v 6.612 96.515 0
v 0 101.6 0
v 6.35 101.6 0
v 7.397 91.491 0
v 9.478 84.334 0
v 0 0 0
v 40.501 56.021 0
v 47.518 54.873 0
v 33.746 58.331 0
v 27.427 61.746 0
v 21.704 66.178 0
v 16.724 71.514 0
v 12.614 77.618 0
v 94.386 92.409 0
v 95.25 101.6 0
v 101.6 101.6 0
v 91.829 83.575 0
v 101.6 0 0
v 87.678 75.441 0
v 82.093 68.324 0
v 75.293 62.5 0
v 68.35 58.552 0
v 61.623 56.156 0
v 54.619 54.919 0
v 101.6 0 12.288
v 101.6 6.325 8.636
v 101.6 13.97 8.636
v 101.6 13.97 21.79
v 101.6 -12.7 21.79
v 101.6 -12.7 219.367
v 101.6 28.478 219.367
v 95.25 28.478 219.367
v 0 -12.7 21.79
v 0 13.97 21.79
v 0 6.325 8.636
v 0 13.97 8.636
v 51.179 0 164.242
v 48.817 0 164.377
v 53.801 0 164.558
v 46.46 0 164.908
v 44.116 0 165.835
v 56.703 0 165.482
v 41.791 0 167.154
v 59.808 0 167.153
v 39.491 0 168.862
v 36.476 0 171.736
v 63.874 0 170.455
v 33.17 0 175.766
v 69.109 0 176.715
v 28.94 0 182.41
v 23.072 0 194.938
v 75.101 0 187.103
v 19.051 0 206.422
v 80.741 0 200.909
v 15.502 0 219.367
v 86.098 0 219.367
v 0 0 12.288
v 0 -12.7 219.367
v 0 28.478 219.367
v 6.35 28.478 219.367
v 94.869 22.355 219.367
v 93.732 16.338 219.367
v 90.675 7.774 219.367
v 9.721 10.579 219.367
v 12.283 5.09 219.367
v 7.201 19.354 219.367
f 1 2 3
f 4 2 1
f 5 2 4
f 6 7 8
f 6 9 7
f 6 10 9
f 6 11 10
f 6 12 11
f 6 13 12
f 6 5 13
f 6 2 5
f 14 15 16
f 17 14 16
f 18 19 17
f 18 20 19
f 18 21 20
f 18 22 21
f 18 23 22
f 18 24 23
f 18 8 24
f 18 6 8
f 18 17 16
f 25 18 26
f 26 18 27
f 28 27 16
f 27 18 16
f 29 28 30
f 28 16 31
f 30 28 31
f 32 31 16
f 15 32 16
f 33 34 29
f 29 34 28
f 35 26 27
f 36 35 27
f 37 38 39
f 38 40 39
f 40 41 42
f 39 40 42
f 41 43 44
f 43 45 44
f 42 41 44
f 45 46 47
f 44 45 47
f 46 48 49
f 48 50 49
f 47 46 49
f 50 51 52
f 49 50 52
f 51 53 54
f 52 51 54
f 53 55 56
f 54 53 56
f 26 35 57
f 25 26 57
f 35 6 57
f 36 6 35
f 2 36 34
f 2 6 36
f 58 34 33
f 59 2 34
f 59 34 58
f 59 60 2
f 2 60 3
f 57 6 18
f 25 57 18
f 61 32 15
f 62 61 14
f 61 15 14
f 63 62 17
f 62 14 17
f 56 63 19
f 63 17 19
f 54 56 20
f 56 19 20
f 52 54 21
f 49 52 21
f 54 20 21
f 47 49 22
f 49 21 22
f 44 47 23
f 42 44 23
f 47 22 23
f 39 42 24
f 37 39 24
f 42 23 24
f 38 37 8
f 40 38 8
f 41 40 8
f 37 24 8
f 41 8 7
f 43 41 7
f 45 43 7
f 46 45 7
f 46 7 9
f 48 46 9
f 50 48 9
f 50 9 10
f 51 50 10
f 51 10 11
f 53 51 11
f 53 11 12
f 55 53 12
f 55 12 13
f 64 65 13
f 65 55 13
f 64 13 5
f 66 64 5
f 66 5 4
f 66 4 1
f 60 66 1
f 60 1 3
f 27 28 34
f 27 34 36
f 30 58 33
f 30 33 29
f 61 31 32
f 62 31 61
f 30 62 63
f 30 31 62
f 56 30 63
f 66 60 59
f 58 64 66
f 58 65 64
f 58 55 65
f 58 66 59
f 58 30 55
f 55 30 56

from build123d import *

# Parameters (mm, degrees)
SKETCH1_W           = 101.6
SKETCH1_H           = 304.8
BOSS_EXTRUDE1_DEPTH = 101.6
CUT_EXTRUDE1_DEPTH  = 101.6
SKETCH4_R           = 44.45
CUT_EXTRUDE2_DEPTH  = 508
SKETCH7_W           = 13.154000108
SKETCH7_H           = 13.97
CUT_EXTRUDE3_DEPTH  = 152.4
SKETCH8_W           = 101.6
SKETCH8_H           = 6.985
BOSS_EXTRUDE2_DEPTH = 6.35
CHAMFER1_SIZE       = 6.731
CHAMFER1_SIZE_2     = 11.658433986
SKETCH9_W           = 101.6
SKETCH9_H           = 292.826685396
BOSS_EXTRUDE3_DEPTH = 12.7
SKETCH10_W          = 101.6
SKETCH10_H          = 95.25
CUT_EXTRUDE4_DEPTH  = 58.42


with BuildPart() as part:
    # Sketch1 → Boss-Extrude1 (new body)
    with BuildSketch(Plane(origin=(0, 0, 0), x_dir=(1, 0, 0), z_dir=(0, 1, 0))):
        with Locations((50.8, -152.4)):
            Rectangle(SKETCH1_W, SKETCH1_H)
    extrude(amount=BOSS_EXTRUDE1_DEPTH)

    # Sketch3 → Cut-Extrude1 (cut)
    with BuildSketch(Plane(origin=(101.6, 0, 0), x_dir=(0, 0, -1), z_dir=(1, 0, 0))):
        Polygon((-304.8, 0), (0, 101.6), (-304.8, 101.6), align=None)
    extrude(amount=-CUT_EXTRUDE1_DEPTH, mode=Mode.SUBTRACT)

    # Sketch4 → Cut-Extrude2 (cut)
    with BuildSketch(Plane(origin=(0, 10.16, -30.48), x_dir=(-1, 0, 0), z_dir=(0, 0.31622776601683794, -0.9486832980505139))):
        with Locations((-50.8, 96.386223082)):
            Circle(SKETCH4_R)
    extrude(amount=-CUT_EXTRUDE2_DEPTH, mode=Mode.SUBTRACT)

    # Sketch7 → Cut-Extrude3 (cut)
    with BuildSketch(Plane(origin=(101.6, 0, 0), x_dir=(0, 0, -1), z_dir=(1, 0, 0))):
        with Locations((-15.213000054, 6.985)):
            Rectangle(SKETCH7_W, SKETCH7_H)
    extrude(amount=-CUT_EXTRUDE3_DEPTH, mode=Mode.SUBTRACT)

    # Sketch8 → Boss-Extrude2 (add)
    with BuildSketch(Plane.XY.offset(8.636)):
        with Locations((50.8, 3.4925)):
            Rectangle(SKETCH8_W, SKETCH8_H)
    extrude(amount=BOSS_EXTRUDE2_DEPTH)

    # Chamfer1
    # the kernel refuses this chamfer: 11.658433986, 6.731 mm, written as the material it takes off along each edge
    with BuildSketch(Plane(origin=(-30.161368486, 6.985, 14.986), x_dir=(0, 0.057893862402671366, -0.9983227437537926), z_dir=(1, 0, 0))) as chamfer1_piece_1_section:
        Polygon((CHAMFER1_SIZE * 0.998322743754, -CHAMFER1_SIZE * 0.0578938624027), (-CHAMFER1_SIZE_2 * 0.0578938624014, -CHAMFER1_SIZE_2 * 0.998322743732), (0, 0), align=None)
    chamfer1_piece_1 = extrude(amount=161.922736972, mode=Mode.PRIVATE)
    chamfer1_piece_1 = split(chamfer1_piece_1, bisect_by=Plane(origin=(50.8, 3.03450116, 8.636), z_dir=(0, 0, 1)), keep=Keep.TOP, mode=Mode.PRIVATE)
    add(chamfer1_piece_1, mode=Mode.SUBTRACT)

    # Sketch9 → Boss-Extrude3 (add)
    with BuildSketch(Plane.XZ):
        with Locations((50.8, 168.203342806)):
            Rectangle(SKETCH9_W, SKETCH9_H)
    extrude(amount=BOSS_EXTRUDE3_DEPTH)

    # Sketch10 → Cut-Extrude4 (cut)
    with BuildSketch(Plane(origin=(0, -12.7, 0), x_dir=(-1, 0, 0), z_dir=(0, -1, 0))):
        with Locations((-50.8, -266.991685504)):
            Rectangle(SKETCH10_W, SKETCH10_H)
    extrude(amount=-CUT_EXTRUDE4_DEPTH, mode=Mode.SUBTRACT)


solid = part.part
